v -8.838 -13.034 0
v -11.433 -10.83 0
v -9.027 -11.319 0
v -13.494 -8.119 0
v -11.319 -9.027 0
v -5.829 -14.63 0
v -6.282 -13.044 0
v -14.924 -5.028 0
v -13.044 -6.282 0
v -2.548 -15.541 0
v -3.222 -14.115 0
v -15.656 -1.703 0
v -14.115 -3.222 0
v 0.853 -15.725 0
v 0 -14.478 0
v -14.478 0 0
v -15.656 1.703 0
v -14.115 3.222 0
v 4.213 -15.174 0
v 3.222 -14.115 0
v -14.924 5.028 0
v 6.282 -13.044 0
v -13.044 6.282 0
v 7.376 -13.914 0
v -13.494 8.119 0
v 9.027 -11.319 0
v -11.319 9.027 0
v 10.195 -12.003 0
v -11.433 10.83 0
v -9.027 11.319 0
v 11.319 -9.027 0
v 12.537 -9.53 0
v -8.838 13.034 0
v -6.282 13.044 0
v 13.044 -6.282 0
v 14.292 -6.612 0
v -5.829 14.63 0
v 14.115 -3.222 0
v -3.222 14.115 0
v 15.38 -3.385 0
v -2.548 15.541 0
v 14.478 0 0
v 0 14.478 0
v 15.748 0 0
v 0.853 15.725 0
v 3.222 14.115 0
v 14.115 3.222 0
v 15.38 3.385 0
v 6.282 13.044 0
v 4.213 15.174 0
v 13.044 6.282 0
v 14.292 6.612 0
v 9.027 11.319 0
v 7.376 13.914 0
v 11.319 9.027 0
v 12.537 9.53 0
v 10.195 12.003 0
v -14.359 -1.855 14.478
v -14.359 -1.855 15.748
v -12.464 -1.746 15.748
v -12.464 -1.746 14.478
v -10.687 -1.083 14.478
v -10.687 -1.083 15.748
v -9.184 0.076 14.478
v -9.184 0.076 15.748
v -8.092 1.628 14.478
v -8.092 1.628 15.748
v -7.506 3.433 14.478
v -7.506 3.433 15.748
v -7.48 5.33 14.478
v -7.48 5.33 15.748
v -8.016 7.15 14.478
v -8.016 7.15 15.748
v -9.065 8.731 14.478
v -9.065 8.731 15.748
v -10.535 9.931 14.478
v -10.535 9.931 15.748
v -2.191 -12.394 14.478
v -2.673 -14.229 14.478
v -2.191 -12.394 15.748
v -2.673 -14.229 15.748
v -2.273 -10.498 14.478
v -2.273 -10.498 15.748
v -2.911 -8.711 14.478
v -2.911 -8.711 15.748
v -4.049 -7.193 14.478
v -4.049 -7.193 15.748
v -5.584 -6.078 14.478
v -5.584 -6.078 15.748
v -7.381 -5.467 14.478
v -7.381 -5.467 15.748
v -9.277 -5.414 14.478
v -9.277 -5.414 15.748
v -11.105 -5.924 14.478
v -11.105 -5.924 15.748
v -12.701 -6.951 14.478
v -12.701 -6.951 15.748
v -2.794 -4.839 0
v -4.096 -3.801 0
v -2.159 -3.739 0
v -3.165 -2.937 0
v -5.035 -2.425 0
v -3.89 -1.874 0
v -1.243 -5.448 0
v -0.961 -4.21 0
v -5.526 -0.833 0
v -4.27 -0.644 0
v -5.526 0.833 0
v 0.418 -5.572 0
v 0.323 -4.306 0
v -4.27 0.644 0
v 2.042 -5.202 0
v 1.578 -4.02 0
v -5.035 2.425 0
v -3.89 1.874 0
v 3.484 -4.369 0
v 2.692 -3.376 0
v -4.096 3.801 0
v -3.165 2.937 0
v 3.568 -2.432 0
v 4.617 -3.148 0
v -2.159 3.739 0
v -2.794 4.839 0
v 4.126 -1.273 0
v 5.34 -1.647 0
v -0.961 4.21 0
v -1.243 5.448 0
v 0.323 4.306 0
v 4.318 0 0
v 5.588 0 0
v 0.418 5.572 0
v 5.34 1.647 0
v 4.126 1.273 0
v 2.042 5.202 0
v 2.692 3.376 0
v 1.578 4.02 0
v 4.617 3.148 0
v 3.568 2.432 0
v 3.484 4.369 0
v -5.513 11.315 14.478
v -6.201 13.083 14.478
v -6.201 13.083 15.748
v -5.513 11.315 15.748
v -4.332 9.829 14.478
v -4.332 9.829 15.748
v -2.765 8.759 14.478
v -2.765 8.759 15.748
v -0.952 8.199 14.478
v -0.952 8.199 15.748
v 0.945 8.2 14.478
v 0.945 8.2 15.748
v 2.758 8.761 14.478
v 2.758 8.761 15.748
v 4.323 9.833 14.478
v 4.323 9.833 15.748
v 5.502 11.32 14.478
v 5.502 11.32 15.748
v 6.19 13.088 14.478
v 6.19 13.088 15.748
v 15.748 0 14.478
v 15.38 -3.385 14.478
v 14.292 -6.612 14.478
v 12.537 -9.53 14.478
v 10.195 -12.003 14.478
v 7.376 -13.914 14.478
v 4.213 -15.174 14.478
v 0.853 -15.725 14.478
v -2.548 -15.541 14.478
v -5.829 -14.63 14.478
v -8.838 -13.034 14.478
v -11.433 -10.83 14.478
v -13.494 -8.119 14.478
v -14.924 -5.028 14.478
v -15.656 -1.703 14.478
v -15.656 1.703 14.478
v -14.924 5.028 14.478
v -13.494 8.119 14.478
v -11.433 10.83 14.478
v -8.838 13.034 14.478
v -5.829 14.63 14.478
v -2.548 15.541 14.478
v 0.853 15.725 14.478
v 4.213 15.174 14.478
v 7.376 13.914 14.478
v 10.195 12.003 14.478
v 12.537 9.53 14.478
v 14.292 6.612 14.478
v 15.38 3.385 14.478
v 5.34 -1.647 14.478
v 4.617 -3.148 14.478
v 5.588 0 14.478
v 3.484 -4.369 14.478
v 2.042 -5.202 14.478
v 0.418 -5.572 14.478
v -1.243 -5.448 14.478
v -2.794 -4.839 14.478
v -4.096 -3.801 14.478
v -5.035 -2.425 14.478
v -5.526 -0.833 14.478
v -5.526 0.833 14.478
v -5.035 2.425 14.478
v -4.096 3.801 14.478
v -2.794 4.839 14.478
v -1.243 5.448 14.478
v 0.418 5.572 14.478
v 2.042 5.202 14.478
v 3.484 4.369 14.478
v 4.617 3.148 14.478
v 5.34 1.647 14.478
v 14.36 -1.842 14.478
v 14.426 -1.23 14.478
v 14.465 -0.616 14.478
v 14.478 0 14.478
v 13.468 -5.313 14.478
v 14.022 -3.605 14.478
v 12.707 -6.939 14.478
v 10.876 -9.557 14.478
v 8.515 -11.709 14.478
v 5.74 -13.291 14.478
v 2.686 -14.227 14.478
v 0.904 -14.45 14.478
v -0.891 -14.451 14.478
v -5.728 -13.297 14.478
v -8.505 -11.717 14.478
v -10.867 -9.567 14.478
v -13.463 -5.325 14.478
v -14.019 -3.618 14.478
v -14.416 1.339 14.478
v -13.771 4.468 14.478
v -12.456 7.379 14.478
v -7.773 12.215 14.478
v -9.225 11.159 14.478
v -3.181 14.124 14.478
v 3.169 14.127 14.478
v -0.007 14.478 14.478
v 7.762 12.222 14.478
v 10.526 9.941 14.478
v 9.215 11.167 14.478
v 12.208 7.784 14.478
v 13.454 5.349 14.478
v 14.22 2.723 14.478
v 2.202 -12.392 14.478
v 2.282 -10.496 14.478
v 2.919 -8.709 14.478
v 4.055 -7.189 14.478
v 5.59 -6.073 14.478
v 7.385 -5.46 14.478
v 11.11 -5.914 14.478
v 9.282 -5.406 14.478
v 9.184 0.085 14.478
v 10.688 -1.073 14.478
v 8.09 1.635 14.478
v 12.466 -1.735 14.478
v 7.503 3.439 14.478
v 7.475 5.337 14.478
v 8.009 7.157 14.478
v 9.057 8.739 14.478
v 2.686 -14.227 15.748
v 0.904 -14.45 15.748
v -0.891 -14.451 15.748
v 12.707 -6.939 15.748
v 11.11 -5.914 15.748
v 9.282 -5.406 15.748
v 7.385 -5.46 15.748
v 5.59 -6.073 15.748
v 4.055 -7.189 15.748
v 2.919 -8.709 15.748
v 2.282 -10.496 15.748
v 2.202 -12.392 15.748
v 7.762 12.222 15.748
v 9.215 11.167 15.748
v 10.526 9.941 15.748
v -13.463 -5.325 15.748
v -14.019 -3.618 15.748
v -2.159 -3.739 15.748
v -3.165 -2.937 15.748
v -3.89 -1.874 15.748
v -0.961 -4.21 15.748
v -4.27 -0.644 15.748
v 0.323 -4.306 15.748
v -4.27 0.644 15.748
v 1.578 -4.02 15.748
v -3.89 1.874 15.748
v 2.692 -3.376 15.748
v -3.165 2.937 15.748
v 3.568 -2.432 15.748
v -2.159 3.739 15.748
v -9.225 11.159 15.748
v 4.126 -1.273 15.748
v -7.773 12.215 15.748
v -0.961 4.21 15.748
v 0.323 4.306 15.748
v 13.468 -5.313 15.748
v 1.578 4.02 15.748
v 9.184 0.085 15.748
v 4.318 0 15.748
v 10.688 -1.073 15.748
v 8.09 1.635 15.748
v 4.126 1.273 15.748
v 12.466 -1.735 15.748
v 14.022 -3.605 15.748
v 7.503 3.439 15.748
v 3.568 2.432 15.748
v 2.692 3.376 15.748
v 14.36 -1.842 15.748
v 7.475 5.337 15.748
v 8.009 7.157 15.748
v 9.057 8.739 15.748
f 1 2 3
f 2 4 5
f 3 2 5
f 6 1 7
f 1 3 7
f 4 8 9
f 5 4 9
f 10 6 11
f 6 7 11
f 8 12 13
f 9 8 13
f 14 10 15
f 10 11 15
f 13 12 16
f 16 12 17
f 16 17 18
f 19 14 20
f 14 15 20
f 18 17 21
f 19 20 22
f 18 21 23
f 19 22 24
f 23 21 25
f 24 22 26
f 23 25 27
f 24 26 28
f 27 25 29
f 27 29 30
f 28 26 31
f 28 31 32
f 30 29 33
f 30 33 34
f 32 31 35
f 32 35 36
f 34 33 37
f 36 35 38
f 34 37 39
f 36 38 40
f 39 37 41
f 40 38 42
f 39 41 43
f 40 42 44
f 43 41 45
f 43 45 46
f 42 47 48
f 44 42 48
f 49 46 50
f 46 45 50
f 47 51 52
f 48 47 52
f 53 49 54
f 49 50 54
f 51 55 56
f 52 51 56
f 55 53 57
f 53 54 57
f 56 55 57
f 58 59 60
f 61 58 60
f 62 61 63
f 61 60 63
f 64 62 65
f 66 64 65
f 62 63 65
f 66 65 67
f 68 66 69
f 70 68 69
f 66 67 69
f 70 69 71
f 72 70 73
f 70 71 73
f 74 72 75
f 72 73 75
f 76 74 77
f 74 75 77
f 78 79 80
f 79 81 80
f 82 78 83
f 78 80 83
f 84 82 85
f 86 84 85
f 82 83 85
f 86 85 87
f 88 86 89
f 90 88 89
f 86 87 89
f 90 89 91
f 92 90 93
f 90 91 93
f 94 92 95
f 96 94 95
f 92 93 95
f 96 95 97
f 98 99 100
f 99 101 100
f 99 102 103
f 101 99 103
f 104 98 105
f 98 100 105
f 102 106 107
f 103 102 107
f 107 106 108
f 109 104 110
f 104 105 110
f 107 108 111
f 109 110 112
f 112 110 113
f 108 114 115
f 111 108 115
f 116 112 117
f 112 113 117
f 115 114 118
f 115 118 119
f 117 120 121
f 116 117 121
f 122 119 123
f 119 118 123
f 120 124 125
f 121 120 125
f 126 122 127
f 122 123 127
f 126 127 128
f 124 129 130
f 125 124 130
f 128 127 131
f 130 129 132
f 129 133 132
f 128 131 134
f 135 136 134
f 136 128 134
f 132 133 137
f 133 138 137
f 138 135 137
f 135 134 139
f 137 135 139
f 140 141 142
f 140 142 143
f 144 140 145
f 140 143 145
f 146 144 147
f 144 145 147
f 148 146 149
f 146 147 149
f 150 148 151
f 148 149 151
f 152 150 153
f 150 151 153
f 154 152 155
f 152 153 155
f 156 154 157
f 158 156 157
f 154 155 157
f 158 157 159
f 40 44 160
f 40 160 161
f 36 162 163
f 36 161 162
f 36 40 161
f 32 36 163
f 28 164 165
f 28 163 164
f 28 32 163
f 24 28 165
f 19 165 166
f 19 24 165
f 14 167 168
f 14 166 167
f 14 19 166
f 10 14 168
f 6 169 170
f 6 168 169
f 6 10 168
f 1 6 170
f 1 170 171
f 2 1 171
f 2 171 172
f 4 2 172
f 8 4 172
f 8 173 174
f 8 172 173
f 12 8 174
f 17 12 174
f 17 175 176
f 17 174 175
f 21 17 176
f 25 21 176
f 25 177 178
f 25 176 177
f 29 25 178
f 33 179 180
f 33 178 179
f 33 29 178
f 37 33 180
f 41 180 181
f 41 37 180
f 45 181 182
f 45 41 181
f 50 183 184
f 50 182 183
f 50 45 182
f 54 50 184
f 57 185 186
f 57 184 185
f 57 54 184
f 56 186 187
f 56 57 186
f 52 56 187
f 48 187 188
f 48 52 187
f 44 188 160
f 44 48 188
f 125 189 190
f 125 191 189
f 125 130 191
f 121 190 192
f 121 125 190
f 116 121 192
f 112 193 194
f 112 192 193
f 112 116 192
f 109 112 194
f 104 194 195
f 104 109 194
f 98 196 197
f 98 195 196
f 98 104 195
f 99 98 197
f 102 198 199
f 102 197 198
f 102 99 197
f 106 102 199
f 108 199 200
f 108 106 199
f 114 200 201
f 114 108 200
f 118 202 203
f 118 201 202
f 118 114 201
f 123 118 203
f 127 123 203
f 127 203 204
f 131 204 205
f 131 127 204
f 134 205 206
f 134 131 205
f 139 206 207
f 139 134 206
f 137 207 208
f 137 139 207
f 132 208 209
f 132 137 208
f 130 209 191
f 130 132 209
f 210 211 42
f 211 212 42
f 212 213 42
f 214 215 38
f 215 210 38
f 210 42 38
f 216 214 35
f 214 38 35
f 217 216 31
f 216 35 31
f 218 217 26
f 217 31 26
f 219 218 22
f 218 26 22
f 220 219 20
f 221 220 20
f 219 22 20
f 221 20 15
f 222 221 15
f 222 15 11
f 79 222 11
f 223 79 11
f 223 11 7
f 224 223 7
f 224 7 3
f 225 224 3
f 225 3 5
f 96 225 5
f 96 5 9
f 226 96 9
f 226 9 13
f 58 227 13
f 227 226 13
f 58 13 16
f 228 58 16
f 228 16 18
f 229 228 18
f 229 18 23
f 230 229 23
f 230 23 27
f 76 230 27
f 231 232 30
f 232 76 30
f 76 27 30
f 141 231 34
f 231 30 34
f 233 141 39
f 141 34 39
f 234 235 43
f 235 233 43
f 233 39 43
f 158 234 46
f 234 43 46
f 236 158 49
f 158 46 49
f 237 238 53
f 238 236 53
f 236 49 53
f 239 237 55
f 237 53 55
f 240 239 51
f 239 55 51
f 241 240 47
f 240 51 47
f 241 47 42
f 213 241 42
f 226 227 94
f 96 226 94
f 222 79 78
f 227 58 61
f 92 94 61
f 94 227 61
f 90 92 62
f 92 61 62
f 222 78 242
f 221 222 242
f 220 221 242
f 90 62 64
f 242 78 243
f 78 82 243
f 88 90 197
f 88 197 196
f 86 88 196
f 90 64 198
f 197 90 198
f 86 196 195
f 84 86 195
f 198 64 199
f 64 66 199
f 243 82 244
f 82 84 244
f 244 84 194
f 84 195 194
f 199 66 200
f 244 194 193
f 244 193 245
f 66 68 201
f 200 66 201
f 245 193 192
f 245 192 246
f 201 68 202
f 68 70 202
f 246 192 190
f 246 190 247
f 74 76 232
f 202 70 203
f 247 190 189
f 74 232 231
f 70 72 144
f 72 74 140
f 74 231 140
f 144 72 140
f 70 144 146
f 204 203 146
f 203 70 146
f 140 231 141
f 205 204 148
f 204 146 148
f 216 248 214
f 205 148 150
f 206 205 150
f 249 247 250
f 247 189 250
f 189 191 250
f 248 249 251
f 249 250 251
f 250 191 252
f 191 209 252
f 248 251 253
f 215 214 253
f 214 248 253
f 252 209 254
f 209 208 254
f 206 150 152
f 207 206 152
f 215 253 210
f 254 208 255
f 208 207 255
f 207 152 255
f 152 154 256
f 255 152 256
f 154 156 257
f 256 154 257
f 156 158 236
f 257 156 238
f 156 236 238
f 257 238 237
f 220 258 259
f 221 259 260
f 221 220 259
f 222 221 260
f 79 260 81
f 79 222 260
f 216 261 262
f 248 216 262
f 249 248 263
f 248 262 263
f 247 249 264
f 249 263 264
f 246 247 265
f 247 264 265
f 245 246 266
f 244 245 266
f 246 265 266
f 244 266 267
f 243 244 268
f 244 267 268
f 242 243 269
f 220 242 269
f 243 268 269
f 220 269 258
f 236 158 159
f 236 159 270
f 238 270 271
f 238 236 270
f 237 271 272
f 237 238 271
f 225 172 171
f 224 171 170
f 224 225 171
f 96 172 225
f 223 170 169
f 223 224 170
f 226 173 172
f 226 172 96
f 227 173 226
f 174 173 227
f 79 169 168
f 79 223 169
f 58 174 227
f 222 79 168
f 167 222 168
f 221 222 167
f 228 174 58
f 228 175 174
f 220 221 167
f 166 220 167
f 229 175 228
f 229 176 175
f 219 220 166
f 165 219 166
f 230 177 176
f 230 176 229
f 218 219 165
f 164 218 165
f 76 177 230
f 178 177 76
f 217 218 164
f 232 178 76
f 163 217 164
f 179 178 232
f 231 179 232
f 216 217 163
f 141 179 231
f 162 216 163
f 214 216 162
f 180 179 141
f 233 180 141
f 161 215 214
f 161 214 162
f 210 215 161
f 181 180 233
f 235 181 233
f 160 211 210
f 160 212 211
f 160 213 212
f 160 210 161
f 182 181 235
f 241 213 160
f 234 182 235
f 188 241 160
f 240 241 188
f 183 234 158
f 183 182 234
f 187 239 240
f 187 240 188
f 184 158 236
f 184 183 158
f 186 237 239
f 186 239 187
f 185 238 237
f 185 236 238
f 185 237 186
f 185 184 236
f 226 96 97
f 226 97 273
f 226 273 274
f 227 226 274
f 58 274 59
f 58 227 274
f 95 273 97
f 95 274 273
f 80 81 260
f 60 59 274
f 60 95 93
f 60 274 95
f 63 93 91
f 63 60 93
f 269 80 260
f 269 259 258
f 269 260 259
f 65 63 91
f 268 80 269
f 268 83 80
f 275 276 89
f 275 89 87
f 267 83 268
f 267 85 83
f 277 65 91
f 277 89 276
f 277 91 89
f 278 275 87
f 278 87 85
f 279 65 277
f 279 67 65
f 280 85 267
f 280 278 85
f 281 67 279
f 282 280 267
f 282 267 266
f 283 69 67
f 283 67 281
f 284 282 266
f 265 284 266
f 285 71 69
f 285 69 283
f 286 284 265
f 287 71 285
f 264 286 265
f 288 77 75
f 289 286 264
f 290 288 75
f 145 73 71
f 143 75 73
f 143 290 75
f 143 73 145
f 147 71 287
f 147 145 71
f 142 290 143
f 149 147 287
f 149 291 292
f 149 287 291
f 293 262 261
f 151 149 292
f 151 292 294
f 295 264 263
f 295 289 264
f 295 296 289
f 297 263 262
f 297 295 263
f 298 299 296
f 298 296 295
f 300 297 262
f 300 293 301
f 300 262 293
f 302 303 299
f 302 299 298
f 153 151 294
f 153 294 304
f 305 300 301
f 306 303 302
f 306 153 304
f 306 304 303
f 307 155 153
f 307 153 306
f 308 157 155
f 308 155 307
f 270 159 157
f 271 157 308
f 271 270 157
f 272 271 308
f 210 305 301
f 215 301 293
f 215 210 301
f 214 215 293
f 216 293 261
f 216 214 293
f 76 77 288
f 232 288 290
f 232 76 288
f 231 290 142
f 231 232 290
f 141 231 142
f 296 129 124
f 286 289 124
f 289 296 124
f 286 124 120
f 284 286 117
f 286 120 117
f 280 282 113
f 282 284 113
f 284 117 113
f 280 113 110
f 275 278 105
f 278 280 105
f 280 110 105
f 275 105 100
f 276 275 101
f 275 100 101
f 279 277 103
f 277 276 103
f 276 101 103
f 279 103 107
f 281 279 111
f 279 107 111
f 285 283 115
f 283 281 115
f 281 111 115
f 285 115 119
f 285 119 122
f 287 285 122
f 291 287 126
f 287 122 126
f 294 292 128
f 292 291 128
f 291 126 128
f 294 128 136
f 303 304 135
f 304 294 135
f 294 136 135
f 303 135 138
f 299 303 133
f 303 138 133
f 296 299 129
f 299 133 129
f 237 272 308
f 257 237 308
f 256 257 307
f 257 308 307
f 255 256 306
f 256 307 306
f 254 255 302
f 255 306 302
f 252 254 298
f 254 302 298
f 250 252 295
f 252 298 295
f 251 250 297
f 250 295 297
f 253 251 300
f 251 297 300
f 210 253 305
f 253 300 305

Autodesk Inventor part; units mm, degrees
ref_plane "YZ Plane" through (0, 0, 0) normal (1, 0, 0) x (0, 1, 0)
ref_plane "XZ Plane" through (0, 0, 0) normal (0, 1, 0) x (-1, 0, 0)
ref_plane "XY Plane" through (0, 0, 0) normal (0, 0, 1) x (1, 0, 0)
sketch "Sketch1" plane through (0, 0, 0) normal (0, 0, 1) x (1, 0, 0)
  circle A0 centre (0, 0) radius 5.588
  circle A1 centre (0, 0) radius 4.318
  circle A2 centre (0, 0) radius 14.478
  circle A3 centre (0, 0) radius 15.748
  dimension "d0" = 11.176
  dimension "d1" = 1.27
  dimension "d2" = 8.89
  dimension "d3" = 1.27
extrude "Extrusion1" add sketch "Sketch1" along normal blind 14.478
sketch "Sketch2" plane through (0, 0, 14.478) normal (0, 0, 1) x (1, 0, 0)
  circle A0 centre (0, 0) radius 14.478 projected
  circle A1 centre (0, 0) radius 15.748 projected
  circle A2 centre (0, 0) radius 5.588 projected
  circle A3 centre (0, 0) radius 4.318 projected
  circle A4 centre (0, 0) radius 5.588 projected
extrude "Extrusion2" add sketch "Sketch2" along normal blind 1.27 contours A0 | A2
sketch "Sketch4" plane through (0, 0, 15.748) normal (0, 0, 1) x (1, 0, 0)
  circle A0 centre (0, 0) radius 14.478 projected
  circle A1 centre (0, 0) radius 4.318 projected
  circle A2 centre (0, 0) radius 14.478 projected
  arc A3 (-6.2014, 13.0826) -> (6.1895, 13.0883) centre (-0.0066, 14.478) ccw
  arc A4 (-14.3587, -1.8551) -> (-10.535, 9.931) centre (-13.7714, 4.4677) ccw
  arc A5 (-2.6728, -14.2292) -> (-12.7005, -6.9505) centre (-8.5046, -11.7168) ccw
  arc A6 (12.7068, -6.939) -> (2.6857, -14.2267) centre (8.5153, -11.7091) ccw
  arc A7 (10.526, 9.9406) -> (14.3603, -1.842) centre (13.7674, 4.4802) ccw
  dimension "d15" = 28.956
  dimension "d8" = 12.7
  dimension "d11" = 360
  dimension "d13" = 6.35
  dimension "d14" = 6.35
  dimension "d16" = 3.81
  dimension "d17" = 8.636
extrude "Extrusion3" cut sketch "Sketch4" against normal blind 1.27 contours A3 A0
pattern_circular "Circular Pattern1" count 5 over 360 about axis through (0, 0, 14.478) along (0, 0, 1) of "Extrusion3"
properties part number "wheelMB"
